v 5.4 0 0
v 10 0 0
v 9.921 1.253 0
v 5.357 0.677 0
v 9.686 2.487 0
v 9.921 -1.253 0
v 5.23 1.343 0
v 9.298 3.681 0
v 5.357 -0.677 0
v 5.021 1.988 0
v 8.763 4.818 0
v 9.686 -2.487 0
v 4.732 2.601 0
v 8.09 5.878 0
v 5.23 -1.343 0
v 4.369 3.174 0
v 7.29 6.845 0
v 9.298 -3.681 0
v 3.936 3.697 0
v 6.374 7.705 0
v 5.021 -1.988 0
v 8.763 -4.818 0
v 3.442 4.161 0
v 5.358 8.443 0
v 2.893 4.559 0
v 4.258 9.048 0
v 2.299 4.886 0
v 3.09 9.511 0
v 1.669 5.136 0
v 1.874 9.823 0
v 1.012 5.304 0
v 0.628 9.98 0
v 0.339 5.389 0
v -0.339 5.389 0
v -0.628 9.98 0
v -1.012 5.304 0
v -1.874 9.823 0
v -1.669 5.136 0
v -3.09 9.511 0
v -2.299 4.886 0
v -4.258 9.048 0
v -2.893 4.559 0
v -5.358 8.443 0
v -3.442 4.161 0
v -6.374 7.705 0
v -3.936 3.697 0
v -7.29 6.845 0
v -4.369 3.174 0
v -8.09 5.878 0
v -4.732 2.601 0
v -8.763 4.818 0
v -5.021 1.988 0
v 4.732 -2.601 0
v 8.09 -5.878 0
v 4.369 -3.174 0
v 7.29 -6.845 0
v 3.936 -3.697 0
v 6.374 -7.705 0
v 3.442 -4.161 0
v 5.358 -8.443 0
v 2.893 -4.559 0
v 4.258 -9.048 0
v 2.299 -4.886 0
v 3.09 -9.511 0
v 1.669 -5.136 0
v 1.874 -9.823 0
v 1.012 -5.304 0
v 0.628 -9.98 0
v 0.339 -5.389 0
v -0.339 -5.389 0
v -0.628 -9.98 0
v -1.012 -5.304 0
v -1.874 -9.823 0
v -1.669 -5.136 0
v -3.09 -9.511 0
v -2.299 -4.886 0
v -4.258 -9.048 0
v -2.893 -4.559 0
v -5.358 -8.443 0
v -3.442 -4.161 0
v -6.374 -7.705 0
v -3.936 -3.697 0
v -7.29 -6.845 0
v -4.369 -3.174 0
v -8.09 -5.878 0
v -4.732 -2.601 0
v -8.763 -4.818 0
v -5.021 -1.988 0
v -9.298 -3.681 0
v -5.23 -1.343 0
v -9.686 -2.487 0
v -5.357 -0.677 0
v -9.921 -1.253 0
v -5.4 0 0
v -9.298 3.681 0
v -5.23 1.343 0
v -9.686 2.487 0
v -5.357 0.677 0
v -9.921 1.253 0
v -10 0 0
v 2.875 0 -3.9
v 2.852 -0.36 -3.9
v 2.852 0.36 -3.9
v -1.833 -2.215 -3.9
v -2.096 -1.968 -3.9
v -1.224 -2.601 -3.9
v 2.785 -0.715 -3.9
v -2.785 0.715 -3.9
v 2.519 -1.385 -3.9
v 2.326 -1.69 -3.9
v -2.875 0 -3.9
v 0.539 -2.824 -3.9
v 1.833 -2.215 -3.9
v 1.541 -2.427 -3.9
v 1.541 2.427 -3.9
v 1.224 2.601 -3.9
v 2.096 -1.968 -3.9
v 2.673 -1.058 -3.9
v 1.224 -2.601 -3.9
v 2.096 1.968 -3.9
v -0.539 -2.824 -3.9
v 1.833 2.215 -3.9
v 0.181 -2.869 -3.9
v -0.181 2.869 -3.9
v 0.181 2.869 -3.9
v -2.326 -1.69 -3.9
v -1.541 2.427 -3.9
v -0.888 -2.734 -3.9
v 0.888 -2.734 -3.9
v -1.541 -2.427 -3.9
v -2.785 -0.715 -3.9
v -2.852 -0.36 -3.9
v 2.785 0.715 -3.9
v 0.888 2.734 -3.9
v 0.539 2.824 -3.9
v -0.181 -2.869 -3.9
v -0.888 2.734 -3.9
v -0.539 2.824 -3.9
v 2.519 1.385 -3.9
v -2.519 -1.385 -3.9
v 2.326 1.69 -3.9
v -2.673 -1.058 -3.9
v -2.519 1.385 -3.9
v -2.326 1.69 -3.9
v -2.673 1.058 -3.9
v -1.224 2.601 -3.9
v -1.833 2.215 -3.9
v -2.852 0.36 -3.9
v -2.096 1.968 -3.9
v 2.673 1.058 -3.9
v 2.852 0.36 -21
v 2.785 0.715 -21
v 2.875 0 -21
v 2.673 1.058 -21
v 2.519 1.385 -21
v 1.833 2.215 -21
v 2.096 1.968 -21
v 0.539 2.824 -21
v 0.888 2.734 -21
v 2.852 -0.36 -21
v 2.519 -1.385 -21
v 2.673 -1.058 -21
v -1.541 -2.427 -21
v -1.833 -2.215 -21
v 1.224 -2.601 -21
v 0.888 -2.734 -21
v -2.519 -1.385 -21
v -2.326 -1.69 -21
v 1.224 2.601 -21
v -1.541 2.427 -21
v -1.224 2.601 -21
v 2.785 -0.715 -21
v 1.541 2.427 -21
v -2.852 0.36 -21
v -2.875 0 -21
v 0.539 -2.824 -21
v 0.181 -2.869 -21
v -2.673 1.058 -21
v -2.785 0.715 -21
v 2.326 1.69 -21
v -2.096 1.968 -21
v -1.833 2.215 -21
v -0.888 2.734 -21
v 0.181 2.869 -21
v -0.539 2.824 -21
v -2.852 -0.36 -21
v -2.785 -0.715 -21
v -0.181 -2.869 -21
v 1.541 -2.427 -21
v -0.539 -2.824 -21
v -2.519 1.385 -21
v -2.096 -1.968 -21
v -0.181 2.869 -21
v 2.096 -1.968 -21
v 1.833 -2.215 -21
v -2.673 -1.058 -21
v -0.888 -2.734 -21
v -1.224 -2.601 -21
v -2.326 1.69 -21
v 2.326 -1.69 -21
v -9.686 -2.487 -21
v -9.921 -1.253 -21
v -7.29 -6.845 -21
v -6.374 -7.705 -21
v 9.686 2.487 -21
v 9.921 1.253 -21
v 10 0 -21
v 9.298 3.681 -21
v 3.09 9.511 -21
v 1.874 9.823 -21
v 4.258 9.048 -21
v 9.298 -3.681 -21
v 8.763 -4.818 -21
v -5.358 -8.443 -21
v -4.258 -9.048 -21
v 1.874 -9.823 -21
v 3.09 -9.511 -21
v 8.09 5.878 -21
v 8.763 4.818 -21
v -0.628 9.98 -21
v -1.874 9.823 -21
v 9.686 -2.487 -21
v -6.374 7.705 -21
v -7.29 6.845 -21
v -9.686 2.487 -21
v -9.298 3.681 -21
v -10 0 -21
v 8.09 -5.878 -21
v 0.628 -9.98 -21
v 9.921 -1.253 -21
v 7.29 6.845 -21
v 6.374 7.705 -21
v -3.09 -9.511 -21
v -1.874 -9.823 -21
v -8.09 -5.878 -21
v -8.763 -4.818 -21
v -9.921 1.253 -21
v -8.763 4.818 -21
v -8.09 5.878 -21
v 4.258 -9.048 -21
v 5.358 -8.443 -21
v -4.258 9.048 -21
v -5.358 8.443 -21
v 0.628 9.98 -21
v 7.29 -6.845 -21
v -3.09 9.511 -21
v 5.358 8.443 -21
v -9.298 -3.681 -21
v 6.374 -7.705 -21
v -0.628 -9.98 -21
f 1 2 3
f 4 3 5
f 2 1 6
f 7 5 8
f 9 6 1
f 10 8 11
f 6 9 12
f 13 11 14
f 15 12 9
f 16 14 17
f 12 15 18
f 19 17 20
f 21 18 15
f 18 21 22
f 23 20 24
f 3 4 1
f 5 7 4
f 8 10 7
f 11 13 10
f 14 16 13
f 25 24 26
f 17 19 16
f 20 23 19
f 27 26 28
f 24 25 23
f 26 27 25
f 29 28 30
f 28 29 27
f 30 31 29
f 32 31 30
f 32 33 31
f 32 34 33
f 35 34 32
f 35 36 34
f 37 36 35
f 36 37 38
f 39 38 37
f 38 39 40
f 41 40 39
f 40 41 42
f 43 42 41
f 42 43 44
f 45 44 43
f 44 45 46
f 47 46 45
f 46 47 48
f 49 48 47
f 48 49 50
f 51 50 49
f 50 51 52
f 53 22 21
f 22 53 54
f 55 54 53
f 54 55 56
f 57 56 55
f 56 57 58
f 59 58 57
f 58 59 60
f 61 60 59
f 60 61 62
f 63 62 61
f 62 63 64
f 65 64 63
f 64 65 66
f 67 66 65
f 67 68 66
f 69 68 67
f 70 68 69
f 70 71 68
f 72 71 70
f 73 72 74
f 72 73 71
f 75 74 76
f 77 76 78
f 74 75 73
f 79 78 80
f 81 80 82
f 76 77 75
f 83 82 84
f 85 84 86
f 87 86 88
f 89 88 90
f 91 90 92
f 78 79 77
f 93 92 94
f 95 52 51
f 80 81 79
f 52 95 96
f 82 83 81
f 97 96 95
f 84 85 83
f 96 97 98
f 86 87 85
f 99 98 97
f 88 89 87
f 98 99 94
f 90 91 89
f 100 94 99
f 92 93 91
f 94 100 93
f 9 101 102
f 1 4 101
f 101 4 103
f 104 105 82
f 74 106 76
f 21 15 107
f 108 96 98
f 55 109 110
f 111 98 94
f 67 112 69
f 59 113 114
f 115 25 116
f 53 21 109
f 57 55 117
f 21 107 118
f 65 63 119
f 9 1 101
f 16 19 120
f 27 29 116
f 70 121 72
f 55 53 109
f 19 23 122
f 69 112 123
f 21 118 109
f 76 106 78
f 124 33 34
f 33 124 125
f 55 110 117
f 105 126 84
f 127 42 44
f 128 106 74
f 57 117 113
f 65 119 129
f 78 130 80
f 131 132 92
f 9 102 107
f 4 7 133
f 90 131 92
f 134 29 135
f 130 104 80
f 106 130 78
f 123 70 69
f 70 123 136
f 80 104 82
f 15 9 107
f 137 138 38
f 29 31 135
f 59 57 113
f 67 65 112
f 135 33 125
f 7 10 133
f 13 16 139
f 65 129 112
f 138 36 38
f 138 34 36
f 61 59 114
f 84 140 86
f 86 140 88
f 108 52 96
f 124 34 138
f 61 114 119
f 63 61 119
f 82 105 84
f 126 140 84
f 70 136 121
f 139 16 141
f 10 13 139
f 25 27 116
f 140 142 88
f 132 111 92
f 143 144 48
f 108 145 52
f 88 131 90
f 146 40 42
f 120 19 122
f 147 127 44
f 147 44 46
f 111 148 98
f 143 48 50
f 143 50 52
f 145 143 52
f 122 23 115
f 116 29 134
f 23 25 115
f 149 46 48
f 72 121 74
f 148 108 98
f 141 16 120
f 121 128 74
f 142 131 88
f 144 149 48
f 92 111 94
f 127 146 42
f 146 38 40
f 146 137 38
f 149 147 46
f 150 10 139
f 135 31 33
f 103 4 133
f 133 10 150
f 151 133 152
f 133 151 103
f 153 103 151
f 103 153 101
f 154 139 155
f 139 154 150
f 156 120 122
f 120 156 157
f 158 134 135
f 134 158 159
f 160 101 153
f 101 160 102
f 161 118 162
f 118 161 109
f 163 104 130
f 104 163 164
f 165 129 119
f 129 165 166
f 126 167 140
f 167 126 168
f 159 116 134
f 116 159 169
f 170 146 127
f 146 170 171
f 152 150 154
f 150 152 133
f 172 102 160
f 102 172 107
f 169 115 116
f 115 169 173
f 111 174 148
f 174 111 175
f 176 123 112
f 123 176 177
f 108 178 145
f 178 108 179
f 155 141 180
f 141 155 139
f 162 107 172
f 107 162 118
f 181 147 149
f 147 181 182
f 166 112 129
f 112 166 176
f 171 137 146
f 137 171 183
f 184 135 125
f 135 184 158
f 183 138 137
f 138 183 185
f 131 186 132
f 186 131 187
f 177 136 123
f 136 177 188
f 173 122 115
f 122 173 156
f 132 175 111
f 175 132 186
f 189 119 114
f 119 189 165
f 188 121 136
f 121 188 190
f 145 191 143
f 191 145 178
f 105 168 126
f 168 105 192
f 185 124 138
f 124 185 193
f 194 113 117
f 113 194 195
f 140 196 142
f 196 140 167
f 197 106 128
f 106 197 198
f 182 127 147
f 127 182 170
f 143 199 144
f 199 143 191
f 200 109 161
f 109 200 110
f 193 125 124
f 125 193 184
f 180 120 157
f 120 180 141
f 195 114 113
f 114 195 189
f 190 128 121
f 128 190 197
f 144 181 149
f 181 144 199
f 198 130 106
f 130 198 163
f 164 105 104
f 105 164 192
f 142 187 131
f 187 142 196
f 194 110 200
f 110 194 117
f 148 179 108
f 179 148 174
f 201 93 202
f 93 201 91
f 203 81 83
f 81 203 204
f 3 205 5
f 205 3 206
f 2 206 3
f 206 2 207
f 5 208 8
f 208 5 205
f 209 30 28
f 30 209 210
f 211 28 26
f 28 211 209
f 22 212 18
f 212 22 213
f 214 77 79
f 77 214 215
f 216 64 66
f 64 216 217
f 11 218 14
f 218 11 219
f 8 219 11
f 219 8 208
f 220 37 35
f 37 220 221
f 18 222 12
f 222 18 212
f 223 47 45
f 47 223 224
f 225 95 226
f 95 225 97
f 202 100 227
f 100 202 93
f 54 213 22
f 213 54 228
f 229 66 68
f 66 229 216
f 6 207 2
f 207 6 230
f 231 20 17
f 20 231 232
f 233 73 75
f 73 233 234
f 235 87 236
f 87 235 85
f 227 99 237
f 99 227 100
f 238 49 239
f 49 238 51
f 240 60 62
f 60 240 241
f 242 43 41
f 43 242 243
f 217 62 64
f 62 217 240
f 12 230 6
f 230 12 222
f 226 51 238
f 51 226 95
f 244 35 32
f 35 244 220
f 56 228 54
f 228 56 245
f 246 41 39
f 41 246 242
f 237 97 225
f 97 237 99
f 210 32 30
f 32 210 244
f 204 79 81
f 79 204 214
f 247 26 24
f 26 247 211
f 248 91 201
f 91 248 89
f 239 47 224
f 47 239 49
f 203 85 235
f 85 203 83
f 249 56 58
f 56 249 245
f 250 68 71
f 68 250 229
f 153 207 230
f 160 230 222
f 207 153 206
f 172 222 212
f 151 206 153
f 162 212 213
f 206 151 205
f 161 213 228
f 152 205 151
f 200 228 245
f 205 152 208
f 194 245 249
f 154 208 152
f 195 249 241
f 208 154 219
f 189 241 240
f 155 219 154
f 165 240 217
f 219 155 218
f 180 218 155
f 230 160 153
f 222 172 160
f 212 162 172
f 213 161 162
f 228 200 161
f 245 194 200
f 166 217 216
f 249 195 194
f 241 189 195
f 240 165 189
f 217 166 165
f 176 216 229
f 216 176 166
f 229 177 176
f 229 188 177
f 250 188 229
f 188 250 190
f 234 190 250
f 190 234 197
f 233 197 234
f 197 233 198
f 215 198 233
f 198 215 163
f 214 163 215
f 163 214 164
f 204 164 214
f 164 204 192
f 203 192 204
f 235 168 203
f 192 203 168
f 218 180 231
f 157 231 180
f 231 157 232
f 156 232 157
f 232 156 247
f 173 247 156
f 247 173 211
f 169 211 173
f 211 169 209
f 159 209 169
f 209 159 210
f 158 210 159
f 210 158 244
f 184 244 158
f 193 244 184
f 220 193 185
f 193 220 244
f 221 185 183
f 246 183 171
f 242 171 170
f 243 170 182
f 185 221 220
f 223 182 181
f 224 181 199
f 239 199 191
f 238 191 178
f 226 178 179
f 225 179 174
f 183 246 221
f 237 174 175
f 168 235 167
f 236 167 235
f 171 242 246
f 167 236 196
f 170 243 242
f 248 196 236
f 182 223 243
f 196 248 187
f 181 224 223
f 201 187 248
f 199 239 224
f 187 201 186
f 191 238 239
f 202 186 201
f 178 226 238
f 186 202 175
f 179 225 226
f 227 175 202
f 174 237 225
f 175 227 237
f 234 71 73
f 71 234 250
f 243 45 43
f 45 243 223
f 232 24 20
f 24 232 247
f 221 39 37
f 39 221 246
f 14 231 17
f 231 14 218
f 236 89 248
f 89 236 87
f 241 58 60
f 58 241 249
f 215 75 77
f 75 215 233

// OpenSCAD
$fn = 50;

difference() {
	union() {
		translate(v = [0, 0, -21.0]) {
			cylinder(h = 21, r = 10.0);
		}
	}
	union() {
		translate(v = [0, 0, 0]) {
			rotate(a = [0, 0, 0]) {
				difference() {
					union() {
						translate(v = [0, 0, -24.0]) {
							cylinder(h = 24, r = 2.6);
						}
						translate(v = [0, 0, -3.9]) {
							cylinder(h = 3.9, r1 = 2.875, r2 = 5.4);
						}
						translate(v = [0, 0, -24.0]) {
							cylinder(h = 24, r = 2.875);
						}
						translate(v = [0, 0, -24.0]) {
							cylinder(h = 24, r = 2.6);
						}
					}
					union();
				}
			}
		}
	}
}
